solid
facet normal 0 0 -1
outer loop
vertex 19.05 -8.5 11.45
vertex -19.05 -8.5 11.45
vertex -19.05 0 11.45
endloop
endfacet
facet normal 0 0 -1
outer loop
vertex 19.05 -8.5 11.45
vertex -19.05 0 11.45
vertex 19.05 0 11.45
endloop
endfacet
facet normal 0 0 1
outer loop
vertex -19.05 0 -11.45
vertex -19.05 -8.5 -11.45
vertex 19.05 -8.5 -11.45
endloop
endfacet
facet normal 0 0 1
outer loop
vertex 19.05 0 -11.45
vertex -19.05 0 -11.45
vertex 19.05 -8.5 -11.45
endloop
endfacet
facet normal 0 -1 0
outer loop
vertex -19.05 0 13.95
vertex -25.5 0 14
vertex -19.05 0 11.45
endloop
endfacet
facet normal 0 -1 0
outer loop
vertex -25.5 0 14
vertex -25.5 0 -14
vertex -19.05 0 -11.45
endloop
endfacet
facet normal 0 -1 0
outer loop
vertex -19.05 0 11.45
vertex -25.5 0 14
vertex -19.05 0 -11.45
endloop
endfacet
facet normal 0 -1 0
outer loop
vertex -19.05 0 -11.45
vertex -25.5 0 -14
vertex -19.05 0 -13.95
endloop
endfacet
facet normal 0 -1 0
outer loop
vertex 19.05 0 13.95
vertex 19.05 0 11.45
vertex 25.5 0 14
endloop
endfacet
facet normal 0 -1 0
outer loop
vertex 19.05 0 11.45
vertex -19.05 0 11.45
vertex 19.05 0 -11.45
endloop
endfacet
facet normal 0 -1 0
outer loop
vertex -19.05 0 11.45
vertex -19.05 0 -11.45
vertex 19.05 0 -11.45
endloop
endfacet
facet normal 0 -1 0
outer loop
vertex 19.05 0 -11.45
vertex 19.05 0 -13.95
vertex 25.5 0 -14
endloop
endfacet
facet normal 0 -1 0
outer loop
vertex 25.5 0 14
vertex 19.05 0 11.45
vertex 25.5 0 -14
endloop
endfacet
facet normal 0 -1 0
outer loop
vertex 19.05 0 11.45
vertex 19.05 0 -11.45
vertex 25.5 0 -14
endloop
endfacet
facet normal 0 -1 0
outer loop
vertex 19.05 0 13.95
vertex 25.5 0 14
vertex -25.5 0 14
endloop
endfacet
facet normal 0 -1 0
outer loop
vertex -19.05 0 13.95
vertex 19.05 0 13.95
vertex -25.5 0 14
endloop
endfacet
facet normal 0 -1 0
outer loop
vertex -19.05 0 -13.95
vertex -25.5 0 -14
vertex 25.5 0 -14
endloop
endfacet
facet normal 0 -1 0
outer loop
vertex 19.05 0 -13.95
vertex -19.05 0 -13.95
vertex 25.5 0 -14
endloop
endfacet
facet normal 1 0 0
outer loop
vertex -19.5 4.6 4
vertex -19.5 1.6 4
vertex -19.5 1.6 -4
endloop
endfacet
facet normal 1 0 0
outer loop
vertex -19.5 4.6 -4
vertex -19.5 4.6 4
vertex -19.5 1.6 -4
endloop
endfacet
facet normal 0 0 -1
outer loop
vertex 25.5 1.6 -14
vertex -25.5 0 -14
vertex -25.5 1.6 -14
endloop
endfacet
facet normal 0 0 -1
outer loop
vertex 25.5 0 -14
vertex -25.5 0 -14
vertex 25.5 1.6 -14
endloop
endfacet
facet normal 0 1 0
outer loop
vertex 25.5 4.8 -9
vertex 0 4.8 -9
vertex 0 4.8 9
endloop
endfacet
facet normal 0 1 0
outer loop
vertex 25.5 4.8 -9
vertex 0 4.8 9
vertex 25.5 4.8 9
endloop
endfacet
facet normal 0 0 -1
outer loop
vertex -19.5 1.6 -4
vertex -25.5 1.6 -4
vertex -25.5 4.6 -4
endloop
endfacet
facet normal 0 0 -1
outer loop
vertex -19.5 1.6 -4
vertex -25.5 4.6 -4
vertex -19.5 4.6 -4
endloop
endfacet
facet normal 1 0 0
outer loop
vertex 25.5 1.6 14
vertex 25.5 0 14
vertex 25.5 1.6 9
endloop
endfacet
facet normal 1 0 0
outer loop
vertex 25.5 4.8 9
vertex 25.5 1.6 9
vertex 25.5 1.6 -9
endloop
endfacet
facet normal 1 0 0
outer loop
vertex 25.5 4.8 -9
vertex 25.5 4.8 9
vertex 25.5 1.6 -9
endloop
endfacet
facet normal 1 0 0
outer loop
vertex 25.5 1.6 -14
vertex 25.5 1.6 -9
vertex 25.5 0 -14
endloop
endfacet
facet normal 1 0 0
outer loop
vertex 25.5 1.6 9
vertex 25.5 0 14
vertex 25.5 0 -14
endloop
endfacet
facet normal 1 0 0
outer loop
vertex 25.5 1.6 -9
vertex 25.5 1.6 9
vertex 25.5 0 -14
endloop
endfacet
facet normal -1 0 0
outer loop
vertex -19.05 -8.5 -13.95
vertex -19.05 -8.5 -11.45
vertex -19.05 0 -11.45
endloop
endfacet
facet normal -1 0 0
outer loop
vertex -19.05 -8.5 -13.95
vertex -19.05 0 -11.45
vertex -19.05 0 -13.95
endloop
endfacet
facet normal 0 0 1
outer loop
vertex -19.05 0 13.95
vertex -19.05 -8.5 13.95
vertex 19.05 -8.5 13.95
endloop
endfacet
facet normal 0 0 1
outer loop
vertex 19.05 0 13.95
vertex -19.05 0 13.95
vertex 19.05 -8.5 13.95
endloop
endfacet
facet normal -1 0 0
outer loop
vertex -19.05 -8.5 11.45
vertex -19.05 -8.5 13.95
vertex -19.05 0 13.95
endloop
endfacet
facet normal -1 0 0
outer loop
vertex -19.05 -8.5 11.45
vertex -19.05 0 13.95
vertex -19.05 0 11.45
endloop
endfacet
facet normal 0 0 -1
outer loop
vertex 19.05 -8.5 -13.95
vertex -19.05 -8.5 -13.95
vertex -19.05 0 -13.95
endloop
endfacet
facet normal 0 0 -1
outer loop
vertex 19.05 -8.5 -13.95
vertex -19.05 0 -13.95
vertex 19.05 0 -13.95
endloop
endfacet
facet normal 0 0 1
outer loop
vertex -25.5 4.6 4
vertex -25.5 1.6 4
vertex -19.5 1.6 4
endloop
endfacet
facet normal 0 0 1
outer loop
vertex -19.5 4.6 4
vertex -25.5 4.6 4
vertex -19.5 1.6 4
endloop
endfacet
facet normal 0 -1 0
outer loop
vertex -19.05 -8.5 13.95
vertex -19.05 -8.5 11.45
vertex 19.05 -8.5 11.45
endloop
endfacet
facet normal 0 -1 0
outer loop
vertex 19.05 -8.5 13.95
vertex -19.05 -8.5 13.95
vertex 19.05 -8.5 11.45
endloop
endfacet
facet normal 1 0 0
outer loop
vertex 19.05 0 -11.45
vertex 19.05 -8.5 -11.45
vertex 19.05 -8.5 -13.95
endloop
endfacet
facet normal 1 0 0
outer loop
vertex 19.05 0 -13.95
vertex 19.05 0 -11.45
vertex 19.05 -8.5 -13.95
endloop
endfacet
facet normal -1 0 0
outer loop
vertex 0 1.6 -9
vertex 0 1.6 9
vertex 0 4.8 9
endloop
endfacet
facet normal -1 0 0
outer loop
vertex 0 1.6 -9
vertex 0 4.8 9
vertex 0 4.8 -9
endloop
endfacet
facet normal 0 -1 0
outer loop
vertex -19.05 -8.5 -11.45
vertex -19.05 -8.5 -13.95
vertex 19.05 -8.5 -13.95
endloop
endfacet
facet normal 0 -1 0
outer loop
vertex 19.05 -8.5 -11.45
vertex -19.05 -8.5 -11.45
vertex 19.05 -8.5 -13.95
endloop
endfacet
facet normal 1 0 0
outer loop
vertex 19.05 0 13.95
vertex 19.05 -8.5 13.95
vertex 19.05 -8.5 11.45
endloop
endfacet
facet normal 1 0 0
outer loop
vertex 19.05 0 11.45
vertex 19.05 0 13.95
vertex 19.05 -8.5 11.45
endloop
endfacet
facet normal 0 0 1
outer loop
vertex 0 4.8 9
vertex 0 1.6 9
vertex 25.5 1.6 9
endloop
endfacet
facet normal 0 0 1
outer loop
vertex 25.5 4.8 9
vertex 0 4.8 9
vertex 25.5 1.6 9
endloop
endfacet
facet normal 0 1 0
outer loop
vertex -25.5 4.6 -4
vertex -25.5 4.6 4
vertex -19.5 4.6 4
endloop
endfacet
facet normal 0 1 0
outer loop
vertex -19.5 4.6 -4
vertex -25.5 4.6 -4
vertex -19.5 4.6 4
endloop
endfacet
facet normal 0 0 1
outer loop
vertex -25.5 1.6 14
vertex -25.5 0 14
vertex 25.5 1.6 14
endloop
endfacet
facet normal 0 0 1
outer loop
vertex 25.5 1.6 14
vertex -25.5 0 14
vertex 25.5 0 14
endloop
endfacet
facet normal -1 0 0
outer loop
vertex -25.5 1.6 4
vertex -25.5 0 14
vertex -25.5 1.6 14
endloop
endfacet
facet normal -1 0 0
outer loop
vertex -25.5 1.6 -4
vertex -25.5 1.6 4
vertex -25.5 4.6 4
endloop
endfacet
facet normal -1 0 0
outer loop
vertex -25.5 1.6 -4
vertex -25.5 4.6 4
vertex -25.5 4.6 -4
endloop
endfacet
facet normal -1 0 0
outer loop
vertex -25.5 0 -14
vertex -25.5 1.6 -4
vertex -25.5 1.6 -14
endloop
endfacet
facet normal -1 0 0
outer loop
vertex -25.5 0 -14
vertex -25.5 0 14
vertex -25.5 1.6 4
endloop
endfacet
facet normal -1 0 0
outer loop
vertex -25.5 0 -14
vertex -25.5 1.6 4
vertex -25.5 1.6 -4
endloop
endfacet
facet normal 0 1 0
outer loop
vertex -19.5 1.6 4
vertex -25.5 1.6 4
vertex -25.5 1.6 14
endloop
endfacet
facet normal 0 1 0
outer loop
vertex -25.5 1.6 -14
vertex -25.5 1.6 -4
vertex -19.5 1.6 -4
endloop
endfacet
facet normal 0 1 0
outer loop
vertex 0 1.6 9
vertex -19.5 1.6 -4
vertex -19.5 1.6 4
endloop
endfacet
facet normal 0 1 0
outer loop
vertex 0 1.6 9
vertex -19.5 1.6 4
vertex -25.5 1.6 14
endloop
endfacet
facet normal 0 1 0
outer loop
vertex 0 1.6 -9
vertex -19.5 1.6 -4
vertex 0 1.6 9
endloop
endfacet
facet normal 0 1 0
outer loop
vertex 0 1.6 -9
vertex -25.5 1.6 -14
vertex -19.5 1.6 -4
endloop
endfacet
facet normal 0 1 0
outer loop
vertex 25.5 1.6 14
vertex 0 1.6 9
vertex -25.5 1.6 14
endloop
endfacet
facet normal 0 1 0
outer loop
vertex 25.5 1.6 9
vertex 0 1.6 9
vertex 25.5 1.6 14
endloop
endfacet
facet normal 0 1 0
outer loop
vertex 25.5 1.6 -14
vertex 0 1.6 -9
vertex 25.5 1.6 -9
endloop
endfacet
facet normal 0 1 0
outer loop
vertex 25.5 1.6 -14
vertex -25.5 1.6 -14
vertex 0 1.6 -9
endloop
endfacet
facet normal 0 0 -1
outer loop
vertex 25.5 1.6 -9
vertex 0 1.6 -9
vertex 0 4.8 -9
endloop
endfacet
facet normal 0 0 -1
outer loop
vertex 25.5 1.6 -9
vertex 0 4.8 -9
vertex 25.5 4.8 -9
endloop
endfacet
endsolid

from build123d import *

# Parameters (mm, degrees)
SKETCH1_W          = 51
SKETCH1_H          = 28
BOARD_DEPTH        = 1.6
WROOM_MODULE_START = 1.6
SKETCH2_W          = 25.5
SKETCH2_H          = 18
WROOM_MODULE_DEPTH = 3.2
MICRO_USB_START    = 1.6
SKETCH3_W          = 6
SKETCH3_H          = 8
MICRO_USB_DEPTH    = 3
HEADER_A_START     = -8.5
SKETCH4_W          = 38.1
SKETCH4_H          = 2.5
HEADER_A_DEPTH     = 8.5
HEADER_B_START     = -8.5
SKETCH5_W          = 38.1
SKETCH5_H          = 2.5
HEADER_B_DEPTH     = 8.5


with BuildPart() as part:
    # Sketch1 → Board (new body)
    with BuildSketch(Plane(origin=(0, 0, 0), x_dir=(1, 0, 0), z_dir=(0, 1, 0))):
        Rectangle(SKETCH1_W, SKETCH1_H)
    extrude(amount=BOARD_DEPTH)

    # Sketch2 → WROOM_Module (add)
    with BuildSketch(Plane(origin=(0, 0, 0), x_dir=(1, 0, 0), z_dir=(0, 1, 0)).offset(WROOM_MODULE_START)):
        with Locations((12.75, 0)):
            Rectangle(SKETCH2_W, SKETCH2_H)
    extrude(amount=WROOM_MODULE_DEPTH)

    # Sketch3 → Micro_USB (add)
    with BuildSketch(Plane(origin=(0, 0, 0), x_dir=(1, 0, 0), z_dir=(0, 1, 0)).offset(MICRO_USB_START)):
        with Locations((-22.5, 0)):
            Rectangle(SKETCH3_W, SKETCH3_H)
    extrude(amount=MICRO_USB_DEPTH)

    # Sketch4 → Header_A (add)
    with BuildSketch(Plane(origin=(0, 0, 0), x_dir=(1, 0, 0), z_dir=(0, 1, 0)).offset(HEADER_A_START)):
        with Locations((0, 12.7)):
            Rectangle(SKETCH4_W, SKETCH4_H)
    extrude(amount=HEADER_A_DEPTH)

    # Sketch5 → Header_B (add)
    with BuildSketch(Plane(origin=(0, 0, 0), x_dir=(1, 0, 0), z_dir=(0, 1, 0)).offset(HEADER_B_START)):
        with Locations((0, -12.7)):
            Rectangle(SKETCH5_W, SKETCH5_H)
    extrude(amount=HEADER_B_DEPTH)


solid = part.part
